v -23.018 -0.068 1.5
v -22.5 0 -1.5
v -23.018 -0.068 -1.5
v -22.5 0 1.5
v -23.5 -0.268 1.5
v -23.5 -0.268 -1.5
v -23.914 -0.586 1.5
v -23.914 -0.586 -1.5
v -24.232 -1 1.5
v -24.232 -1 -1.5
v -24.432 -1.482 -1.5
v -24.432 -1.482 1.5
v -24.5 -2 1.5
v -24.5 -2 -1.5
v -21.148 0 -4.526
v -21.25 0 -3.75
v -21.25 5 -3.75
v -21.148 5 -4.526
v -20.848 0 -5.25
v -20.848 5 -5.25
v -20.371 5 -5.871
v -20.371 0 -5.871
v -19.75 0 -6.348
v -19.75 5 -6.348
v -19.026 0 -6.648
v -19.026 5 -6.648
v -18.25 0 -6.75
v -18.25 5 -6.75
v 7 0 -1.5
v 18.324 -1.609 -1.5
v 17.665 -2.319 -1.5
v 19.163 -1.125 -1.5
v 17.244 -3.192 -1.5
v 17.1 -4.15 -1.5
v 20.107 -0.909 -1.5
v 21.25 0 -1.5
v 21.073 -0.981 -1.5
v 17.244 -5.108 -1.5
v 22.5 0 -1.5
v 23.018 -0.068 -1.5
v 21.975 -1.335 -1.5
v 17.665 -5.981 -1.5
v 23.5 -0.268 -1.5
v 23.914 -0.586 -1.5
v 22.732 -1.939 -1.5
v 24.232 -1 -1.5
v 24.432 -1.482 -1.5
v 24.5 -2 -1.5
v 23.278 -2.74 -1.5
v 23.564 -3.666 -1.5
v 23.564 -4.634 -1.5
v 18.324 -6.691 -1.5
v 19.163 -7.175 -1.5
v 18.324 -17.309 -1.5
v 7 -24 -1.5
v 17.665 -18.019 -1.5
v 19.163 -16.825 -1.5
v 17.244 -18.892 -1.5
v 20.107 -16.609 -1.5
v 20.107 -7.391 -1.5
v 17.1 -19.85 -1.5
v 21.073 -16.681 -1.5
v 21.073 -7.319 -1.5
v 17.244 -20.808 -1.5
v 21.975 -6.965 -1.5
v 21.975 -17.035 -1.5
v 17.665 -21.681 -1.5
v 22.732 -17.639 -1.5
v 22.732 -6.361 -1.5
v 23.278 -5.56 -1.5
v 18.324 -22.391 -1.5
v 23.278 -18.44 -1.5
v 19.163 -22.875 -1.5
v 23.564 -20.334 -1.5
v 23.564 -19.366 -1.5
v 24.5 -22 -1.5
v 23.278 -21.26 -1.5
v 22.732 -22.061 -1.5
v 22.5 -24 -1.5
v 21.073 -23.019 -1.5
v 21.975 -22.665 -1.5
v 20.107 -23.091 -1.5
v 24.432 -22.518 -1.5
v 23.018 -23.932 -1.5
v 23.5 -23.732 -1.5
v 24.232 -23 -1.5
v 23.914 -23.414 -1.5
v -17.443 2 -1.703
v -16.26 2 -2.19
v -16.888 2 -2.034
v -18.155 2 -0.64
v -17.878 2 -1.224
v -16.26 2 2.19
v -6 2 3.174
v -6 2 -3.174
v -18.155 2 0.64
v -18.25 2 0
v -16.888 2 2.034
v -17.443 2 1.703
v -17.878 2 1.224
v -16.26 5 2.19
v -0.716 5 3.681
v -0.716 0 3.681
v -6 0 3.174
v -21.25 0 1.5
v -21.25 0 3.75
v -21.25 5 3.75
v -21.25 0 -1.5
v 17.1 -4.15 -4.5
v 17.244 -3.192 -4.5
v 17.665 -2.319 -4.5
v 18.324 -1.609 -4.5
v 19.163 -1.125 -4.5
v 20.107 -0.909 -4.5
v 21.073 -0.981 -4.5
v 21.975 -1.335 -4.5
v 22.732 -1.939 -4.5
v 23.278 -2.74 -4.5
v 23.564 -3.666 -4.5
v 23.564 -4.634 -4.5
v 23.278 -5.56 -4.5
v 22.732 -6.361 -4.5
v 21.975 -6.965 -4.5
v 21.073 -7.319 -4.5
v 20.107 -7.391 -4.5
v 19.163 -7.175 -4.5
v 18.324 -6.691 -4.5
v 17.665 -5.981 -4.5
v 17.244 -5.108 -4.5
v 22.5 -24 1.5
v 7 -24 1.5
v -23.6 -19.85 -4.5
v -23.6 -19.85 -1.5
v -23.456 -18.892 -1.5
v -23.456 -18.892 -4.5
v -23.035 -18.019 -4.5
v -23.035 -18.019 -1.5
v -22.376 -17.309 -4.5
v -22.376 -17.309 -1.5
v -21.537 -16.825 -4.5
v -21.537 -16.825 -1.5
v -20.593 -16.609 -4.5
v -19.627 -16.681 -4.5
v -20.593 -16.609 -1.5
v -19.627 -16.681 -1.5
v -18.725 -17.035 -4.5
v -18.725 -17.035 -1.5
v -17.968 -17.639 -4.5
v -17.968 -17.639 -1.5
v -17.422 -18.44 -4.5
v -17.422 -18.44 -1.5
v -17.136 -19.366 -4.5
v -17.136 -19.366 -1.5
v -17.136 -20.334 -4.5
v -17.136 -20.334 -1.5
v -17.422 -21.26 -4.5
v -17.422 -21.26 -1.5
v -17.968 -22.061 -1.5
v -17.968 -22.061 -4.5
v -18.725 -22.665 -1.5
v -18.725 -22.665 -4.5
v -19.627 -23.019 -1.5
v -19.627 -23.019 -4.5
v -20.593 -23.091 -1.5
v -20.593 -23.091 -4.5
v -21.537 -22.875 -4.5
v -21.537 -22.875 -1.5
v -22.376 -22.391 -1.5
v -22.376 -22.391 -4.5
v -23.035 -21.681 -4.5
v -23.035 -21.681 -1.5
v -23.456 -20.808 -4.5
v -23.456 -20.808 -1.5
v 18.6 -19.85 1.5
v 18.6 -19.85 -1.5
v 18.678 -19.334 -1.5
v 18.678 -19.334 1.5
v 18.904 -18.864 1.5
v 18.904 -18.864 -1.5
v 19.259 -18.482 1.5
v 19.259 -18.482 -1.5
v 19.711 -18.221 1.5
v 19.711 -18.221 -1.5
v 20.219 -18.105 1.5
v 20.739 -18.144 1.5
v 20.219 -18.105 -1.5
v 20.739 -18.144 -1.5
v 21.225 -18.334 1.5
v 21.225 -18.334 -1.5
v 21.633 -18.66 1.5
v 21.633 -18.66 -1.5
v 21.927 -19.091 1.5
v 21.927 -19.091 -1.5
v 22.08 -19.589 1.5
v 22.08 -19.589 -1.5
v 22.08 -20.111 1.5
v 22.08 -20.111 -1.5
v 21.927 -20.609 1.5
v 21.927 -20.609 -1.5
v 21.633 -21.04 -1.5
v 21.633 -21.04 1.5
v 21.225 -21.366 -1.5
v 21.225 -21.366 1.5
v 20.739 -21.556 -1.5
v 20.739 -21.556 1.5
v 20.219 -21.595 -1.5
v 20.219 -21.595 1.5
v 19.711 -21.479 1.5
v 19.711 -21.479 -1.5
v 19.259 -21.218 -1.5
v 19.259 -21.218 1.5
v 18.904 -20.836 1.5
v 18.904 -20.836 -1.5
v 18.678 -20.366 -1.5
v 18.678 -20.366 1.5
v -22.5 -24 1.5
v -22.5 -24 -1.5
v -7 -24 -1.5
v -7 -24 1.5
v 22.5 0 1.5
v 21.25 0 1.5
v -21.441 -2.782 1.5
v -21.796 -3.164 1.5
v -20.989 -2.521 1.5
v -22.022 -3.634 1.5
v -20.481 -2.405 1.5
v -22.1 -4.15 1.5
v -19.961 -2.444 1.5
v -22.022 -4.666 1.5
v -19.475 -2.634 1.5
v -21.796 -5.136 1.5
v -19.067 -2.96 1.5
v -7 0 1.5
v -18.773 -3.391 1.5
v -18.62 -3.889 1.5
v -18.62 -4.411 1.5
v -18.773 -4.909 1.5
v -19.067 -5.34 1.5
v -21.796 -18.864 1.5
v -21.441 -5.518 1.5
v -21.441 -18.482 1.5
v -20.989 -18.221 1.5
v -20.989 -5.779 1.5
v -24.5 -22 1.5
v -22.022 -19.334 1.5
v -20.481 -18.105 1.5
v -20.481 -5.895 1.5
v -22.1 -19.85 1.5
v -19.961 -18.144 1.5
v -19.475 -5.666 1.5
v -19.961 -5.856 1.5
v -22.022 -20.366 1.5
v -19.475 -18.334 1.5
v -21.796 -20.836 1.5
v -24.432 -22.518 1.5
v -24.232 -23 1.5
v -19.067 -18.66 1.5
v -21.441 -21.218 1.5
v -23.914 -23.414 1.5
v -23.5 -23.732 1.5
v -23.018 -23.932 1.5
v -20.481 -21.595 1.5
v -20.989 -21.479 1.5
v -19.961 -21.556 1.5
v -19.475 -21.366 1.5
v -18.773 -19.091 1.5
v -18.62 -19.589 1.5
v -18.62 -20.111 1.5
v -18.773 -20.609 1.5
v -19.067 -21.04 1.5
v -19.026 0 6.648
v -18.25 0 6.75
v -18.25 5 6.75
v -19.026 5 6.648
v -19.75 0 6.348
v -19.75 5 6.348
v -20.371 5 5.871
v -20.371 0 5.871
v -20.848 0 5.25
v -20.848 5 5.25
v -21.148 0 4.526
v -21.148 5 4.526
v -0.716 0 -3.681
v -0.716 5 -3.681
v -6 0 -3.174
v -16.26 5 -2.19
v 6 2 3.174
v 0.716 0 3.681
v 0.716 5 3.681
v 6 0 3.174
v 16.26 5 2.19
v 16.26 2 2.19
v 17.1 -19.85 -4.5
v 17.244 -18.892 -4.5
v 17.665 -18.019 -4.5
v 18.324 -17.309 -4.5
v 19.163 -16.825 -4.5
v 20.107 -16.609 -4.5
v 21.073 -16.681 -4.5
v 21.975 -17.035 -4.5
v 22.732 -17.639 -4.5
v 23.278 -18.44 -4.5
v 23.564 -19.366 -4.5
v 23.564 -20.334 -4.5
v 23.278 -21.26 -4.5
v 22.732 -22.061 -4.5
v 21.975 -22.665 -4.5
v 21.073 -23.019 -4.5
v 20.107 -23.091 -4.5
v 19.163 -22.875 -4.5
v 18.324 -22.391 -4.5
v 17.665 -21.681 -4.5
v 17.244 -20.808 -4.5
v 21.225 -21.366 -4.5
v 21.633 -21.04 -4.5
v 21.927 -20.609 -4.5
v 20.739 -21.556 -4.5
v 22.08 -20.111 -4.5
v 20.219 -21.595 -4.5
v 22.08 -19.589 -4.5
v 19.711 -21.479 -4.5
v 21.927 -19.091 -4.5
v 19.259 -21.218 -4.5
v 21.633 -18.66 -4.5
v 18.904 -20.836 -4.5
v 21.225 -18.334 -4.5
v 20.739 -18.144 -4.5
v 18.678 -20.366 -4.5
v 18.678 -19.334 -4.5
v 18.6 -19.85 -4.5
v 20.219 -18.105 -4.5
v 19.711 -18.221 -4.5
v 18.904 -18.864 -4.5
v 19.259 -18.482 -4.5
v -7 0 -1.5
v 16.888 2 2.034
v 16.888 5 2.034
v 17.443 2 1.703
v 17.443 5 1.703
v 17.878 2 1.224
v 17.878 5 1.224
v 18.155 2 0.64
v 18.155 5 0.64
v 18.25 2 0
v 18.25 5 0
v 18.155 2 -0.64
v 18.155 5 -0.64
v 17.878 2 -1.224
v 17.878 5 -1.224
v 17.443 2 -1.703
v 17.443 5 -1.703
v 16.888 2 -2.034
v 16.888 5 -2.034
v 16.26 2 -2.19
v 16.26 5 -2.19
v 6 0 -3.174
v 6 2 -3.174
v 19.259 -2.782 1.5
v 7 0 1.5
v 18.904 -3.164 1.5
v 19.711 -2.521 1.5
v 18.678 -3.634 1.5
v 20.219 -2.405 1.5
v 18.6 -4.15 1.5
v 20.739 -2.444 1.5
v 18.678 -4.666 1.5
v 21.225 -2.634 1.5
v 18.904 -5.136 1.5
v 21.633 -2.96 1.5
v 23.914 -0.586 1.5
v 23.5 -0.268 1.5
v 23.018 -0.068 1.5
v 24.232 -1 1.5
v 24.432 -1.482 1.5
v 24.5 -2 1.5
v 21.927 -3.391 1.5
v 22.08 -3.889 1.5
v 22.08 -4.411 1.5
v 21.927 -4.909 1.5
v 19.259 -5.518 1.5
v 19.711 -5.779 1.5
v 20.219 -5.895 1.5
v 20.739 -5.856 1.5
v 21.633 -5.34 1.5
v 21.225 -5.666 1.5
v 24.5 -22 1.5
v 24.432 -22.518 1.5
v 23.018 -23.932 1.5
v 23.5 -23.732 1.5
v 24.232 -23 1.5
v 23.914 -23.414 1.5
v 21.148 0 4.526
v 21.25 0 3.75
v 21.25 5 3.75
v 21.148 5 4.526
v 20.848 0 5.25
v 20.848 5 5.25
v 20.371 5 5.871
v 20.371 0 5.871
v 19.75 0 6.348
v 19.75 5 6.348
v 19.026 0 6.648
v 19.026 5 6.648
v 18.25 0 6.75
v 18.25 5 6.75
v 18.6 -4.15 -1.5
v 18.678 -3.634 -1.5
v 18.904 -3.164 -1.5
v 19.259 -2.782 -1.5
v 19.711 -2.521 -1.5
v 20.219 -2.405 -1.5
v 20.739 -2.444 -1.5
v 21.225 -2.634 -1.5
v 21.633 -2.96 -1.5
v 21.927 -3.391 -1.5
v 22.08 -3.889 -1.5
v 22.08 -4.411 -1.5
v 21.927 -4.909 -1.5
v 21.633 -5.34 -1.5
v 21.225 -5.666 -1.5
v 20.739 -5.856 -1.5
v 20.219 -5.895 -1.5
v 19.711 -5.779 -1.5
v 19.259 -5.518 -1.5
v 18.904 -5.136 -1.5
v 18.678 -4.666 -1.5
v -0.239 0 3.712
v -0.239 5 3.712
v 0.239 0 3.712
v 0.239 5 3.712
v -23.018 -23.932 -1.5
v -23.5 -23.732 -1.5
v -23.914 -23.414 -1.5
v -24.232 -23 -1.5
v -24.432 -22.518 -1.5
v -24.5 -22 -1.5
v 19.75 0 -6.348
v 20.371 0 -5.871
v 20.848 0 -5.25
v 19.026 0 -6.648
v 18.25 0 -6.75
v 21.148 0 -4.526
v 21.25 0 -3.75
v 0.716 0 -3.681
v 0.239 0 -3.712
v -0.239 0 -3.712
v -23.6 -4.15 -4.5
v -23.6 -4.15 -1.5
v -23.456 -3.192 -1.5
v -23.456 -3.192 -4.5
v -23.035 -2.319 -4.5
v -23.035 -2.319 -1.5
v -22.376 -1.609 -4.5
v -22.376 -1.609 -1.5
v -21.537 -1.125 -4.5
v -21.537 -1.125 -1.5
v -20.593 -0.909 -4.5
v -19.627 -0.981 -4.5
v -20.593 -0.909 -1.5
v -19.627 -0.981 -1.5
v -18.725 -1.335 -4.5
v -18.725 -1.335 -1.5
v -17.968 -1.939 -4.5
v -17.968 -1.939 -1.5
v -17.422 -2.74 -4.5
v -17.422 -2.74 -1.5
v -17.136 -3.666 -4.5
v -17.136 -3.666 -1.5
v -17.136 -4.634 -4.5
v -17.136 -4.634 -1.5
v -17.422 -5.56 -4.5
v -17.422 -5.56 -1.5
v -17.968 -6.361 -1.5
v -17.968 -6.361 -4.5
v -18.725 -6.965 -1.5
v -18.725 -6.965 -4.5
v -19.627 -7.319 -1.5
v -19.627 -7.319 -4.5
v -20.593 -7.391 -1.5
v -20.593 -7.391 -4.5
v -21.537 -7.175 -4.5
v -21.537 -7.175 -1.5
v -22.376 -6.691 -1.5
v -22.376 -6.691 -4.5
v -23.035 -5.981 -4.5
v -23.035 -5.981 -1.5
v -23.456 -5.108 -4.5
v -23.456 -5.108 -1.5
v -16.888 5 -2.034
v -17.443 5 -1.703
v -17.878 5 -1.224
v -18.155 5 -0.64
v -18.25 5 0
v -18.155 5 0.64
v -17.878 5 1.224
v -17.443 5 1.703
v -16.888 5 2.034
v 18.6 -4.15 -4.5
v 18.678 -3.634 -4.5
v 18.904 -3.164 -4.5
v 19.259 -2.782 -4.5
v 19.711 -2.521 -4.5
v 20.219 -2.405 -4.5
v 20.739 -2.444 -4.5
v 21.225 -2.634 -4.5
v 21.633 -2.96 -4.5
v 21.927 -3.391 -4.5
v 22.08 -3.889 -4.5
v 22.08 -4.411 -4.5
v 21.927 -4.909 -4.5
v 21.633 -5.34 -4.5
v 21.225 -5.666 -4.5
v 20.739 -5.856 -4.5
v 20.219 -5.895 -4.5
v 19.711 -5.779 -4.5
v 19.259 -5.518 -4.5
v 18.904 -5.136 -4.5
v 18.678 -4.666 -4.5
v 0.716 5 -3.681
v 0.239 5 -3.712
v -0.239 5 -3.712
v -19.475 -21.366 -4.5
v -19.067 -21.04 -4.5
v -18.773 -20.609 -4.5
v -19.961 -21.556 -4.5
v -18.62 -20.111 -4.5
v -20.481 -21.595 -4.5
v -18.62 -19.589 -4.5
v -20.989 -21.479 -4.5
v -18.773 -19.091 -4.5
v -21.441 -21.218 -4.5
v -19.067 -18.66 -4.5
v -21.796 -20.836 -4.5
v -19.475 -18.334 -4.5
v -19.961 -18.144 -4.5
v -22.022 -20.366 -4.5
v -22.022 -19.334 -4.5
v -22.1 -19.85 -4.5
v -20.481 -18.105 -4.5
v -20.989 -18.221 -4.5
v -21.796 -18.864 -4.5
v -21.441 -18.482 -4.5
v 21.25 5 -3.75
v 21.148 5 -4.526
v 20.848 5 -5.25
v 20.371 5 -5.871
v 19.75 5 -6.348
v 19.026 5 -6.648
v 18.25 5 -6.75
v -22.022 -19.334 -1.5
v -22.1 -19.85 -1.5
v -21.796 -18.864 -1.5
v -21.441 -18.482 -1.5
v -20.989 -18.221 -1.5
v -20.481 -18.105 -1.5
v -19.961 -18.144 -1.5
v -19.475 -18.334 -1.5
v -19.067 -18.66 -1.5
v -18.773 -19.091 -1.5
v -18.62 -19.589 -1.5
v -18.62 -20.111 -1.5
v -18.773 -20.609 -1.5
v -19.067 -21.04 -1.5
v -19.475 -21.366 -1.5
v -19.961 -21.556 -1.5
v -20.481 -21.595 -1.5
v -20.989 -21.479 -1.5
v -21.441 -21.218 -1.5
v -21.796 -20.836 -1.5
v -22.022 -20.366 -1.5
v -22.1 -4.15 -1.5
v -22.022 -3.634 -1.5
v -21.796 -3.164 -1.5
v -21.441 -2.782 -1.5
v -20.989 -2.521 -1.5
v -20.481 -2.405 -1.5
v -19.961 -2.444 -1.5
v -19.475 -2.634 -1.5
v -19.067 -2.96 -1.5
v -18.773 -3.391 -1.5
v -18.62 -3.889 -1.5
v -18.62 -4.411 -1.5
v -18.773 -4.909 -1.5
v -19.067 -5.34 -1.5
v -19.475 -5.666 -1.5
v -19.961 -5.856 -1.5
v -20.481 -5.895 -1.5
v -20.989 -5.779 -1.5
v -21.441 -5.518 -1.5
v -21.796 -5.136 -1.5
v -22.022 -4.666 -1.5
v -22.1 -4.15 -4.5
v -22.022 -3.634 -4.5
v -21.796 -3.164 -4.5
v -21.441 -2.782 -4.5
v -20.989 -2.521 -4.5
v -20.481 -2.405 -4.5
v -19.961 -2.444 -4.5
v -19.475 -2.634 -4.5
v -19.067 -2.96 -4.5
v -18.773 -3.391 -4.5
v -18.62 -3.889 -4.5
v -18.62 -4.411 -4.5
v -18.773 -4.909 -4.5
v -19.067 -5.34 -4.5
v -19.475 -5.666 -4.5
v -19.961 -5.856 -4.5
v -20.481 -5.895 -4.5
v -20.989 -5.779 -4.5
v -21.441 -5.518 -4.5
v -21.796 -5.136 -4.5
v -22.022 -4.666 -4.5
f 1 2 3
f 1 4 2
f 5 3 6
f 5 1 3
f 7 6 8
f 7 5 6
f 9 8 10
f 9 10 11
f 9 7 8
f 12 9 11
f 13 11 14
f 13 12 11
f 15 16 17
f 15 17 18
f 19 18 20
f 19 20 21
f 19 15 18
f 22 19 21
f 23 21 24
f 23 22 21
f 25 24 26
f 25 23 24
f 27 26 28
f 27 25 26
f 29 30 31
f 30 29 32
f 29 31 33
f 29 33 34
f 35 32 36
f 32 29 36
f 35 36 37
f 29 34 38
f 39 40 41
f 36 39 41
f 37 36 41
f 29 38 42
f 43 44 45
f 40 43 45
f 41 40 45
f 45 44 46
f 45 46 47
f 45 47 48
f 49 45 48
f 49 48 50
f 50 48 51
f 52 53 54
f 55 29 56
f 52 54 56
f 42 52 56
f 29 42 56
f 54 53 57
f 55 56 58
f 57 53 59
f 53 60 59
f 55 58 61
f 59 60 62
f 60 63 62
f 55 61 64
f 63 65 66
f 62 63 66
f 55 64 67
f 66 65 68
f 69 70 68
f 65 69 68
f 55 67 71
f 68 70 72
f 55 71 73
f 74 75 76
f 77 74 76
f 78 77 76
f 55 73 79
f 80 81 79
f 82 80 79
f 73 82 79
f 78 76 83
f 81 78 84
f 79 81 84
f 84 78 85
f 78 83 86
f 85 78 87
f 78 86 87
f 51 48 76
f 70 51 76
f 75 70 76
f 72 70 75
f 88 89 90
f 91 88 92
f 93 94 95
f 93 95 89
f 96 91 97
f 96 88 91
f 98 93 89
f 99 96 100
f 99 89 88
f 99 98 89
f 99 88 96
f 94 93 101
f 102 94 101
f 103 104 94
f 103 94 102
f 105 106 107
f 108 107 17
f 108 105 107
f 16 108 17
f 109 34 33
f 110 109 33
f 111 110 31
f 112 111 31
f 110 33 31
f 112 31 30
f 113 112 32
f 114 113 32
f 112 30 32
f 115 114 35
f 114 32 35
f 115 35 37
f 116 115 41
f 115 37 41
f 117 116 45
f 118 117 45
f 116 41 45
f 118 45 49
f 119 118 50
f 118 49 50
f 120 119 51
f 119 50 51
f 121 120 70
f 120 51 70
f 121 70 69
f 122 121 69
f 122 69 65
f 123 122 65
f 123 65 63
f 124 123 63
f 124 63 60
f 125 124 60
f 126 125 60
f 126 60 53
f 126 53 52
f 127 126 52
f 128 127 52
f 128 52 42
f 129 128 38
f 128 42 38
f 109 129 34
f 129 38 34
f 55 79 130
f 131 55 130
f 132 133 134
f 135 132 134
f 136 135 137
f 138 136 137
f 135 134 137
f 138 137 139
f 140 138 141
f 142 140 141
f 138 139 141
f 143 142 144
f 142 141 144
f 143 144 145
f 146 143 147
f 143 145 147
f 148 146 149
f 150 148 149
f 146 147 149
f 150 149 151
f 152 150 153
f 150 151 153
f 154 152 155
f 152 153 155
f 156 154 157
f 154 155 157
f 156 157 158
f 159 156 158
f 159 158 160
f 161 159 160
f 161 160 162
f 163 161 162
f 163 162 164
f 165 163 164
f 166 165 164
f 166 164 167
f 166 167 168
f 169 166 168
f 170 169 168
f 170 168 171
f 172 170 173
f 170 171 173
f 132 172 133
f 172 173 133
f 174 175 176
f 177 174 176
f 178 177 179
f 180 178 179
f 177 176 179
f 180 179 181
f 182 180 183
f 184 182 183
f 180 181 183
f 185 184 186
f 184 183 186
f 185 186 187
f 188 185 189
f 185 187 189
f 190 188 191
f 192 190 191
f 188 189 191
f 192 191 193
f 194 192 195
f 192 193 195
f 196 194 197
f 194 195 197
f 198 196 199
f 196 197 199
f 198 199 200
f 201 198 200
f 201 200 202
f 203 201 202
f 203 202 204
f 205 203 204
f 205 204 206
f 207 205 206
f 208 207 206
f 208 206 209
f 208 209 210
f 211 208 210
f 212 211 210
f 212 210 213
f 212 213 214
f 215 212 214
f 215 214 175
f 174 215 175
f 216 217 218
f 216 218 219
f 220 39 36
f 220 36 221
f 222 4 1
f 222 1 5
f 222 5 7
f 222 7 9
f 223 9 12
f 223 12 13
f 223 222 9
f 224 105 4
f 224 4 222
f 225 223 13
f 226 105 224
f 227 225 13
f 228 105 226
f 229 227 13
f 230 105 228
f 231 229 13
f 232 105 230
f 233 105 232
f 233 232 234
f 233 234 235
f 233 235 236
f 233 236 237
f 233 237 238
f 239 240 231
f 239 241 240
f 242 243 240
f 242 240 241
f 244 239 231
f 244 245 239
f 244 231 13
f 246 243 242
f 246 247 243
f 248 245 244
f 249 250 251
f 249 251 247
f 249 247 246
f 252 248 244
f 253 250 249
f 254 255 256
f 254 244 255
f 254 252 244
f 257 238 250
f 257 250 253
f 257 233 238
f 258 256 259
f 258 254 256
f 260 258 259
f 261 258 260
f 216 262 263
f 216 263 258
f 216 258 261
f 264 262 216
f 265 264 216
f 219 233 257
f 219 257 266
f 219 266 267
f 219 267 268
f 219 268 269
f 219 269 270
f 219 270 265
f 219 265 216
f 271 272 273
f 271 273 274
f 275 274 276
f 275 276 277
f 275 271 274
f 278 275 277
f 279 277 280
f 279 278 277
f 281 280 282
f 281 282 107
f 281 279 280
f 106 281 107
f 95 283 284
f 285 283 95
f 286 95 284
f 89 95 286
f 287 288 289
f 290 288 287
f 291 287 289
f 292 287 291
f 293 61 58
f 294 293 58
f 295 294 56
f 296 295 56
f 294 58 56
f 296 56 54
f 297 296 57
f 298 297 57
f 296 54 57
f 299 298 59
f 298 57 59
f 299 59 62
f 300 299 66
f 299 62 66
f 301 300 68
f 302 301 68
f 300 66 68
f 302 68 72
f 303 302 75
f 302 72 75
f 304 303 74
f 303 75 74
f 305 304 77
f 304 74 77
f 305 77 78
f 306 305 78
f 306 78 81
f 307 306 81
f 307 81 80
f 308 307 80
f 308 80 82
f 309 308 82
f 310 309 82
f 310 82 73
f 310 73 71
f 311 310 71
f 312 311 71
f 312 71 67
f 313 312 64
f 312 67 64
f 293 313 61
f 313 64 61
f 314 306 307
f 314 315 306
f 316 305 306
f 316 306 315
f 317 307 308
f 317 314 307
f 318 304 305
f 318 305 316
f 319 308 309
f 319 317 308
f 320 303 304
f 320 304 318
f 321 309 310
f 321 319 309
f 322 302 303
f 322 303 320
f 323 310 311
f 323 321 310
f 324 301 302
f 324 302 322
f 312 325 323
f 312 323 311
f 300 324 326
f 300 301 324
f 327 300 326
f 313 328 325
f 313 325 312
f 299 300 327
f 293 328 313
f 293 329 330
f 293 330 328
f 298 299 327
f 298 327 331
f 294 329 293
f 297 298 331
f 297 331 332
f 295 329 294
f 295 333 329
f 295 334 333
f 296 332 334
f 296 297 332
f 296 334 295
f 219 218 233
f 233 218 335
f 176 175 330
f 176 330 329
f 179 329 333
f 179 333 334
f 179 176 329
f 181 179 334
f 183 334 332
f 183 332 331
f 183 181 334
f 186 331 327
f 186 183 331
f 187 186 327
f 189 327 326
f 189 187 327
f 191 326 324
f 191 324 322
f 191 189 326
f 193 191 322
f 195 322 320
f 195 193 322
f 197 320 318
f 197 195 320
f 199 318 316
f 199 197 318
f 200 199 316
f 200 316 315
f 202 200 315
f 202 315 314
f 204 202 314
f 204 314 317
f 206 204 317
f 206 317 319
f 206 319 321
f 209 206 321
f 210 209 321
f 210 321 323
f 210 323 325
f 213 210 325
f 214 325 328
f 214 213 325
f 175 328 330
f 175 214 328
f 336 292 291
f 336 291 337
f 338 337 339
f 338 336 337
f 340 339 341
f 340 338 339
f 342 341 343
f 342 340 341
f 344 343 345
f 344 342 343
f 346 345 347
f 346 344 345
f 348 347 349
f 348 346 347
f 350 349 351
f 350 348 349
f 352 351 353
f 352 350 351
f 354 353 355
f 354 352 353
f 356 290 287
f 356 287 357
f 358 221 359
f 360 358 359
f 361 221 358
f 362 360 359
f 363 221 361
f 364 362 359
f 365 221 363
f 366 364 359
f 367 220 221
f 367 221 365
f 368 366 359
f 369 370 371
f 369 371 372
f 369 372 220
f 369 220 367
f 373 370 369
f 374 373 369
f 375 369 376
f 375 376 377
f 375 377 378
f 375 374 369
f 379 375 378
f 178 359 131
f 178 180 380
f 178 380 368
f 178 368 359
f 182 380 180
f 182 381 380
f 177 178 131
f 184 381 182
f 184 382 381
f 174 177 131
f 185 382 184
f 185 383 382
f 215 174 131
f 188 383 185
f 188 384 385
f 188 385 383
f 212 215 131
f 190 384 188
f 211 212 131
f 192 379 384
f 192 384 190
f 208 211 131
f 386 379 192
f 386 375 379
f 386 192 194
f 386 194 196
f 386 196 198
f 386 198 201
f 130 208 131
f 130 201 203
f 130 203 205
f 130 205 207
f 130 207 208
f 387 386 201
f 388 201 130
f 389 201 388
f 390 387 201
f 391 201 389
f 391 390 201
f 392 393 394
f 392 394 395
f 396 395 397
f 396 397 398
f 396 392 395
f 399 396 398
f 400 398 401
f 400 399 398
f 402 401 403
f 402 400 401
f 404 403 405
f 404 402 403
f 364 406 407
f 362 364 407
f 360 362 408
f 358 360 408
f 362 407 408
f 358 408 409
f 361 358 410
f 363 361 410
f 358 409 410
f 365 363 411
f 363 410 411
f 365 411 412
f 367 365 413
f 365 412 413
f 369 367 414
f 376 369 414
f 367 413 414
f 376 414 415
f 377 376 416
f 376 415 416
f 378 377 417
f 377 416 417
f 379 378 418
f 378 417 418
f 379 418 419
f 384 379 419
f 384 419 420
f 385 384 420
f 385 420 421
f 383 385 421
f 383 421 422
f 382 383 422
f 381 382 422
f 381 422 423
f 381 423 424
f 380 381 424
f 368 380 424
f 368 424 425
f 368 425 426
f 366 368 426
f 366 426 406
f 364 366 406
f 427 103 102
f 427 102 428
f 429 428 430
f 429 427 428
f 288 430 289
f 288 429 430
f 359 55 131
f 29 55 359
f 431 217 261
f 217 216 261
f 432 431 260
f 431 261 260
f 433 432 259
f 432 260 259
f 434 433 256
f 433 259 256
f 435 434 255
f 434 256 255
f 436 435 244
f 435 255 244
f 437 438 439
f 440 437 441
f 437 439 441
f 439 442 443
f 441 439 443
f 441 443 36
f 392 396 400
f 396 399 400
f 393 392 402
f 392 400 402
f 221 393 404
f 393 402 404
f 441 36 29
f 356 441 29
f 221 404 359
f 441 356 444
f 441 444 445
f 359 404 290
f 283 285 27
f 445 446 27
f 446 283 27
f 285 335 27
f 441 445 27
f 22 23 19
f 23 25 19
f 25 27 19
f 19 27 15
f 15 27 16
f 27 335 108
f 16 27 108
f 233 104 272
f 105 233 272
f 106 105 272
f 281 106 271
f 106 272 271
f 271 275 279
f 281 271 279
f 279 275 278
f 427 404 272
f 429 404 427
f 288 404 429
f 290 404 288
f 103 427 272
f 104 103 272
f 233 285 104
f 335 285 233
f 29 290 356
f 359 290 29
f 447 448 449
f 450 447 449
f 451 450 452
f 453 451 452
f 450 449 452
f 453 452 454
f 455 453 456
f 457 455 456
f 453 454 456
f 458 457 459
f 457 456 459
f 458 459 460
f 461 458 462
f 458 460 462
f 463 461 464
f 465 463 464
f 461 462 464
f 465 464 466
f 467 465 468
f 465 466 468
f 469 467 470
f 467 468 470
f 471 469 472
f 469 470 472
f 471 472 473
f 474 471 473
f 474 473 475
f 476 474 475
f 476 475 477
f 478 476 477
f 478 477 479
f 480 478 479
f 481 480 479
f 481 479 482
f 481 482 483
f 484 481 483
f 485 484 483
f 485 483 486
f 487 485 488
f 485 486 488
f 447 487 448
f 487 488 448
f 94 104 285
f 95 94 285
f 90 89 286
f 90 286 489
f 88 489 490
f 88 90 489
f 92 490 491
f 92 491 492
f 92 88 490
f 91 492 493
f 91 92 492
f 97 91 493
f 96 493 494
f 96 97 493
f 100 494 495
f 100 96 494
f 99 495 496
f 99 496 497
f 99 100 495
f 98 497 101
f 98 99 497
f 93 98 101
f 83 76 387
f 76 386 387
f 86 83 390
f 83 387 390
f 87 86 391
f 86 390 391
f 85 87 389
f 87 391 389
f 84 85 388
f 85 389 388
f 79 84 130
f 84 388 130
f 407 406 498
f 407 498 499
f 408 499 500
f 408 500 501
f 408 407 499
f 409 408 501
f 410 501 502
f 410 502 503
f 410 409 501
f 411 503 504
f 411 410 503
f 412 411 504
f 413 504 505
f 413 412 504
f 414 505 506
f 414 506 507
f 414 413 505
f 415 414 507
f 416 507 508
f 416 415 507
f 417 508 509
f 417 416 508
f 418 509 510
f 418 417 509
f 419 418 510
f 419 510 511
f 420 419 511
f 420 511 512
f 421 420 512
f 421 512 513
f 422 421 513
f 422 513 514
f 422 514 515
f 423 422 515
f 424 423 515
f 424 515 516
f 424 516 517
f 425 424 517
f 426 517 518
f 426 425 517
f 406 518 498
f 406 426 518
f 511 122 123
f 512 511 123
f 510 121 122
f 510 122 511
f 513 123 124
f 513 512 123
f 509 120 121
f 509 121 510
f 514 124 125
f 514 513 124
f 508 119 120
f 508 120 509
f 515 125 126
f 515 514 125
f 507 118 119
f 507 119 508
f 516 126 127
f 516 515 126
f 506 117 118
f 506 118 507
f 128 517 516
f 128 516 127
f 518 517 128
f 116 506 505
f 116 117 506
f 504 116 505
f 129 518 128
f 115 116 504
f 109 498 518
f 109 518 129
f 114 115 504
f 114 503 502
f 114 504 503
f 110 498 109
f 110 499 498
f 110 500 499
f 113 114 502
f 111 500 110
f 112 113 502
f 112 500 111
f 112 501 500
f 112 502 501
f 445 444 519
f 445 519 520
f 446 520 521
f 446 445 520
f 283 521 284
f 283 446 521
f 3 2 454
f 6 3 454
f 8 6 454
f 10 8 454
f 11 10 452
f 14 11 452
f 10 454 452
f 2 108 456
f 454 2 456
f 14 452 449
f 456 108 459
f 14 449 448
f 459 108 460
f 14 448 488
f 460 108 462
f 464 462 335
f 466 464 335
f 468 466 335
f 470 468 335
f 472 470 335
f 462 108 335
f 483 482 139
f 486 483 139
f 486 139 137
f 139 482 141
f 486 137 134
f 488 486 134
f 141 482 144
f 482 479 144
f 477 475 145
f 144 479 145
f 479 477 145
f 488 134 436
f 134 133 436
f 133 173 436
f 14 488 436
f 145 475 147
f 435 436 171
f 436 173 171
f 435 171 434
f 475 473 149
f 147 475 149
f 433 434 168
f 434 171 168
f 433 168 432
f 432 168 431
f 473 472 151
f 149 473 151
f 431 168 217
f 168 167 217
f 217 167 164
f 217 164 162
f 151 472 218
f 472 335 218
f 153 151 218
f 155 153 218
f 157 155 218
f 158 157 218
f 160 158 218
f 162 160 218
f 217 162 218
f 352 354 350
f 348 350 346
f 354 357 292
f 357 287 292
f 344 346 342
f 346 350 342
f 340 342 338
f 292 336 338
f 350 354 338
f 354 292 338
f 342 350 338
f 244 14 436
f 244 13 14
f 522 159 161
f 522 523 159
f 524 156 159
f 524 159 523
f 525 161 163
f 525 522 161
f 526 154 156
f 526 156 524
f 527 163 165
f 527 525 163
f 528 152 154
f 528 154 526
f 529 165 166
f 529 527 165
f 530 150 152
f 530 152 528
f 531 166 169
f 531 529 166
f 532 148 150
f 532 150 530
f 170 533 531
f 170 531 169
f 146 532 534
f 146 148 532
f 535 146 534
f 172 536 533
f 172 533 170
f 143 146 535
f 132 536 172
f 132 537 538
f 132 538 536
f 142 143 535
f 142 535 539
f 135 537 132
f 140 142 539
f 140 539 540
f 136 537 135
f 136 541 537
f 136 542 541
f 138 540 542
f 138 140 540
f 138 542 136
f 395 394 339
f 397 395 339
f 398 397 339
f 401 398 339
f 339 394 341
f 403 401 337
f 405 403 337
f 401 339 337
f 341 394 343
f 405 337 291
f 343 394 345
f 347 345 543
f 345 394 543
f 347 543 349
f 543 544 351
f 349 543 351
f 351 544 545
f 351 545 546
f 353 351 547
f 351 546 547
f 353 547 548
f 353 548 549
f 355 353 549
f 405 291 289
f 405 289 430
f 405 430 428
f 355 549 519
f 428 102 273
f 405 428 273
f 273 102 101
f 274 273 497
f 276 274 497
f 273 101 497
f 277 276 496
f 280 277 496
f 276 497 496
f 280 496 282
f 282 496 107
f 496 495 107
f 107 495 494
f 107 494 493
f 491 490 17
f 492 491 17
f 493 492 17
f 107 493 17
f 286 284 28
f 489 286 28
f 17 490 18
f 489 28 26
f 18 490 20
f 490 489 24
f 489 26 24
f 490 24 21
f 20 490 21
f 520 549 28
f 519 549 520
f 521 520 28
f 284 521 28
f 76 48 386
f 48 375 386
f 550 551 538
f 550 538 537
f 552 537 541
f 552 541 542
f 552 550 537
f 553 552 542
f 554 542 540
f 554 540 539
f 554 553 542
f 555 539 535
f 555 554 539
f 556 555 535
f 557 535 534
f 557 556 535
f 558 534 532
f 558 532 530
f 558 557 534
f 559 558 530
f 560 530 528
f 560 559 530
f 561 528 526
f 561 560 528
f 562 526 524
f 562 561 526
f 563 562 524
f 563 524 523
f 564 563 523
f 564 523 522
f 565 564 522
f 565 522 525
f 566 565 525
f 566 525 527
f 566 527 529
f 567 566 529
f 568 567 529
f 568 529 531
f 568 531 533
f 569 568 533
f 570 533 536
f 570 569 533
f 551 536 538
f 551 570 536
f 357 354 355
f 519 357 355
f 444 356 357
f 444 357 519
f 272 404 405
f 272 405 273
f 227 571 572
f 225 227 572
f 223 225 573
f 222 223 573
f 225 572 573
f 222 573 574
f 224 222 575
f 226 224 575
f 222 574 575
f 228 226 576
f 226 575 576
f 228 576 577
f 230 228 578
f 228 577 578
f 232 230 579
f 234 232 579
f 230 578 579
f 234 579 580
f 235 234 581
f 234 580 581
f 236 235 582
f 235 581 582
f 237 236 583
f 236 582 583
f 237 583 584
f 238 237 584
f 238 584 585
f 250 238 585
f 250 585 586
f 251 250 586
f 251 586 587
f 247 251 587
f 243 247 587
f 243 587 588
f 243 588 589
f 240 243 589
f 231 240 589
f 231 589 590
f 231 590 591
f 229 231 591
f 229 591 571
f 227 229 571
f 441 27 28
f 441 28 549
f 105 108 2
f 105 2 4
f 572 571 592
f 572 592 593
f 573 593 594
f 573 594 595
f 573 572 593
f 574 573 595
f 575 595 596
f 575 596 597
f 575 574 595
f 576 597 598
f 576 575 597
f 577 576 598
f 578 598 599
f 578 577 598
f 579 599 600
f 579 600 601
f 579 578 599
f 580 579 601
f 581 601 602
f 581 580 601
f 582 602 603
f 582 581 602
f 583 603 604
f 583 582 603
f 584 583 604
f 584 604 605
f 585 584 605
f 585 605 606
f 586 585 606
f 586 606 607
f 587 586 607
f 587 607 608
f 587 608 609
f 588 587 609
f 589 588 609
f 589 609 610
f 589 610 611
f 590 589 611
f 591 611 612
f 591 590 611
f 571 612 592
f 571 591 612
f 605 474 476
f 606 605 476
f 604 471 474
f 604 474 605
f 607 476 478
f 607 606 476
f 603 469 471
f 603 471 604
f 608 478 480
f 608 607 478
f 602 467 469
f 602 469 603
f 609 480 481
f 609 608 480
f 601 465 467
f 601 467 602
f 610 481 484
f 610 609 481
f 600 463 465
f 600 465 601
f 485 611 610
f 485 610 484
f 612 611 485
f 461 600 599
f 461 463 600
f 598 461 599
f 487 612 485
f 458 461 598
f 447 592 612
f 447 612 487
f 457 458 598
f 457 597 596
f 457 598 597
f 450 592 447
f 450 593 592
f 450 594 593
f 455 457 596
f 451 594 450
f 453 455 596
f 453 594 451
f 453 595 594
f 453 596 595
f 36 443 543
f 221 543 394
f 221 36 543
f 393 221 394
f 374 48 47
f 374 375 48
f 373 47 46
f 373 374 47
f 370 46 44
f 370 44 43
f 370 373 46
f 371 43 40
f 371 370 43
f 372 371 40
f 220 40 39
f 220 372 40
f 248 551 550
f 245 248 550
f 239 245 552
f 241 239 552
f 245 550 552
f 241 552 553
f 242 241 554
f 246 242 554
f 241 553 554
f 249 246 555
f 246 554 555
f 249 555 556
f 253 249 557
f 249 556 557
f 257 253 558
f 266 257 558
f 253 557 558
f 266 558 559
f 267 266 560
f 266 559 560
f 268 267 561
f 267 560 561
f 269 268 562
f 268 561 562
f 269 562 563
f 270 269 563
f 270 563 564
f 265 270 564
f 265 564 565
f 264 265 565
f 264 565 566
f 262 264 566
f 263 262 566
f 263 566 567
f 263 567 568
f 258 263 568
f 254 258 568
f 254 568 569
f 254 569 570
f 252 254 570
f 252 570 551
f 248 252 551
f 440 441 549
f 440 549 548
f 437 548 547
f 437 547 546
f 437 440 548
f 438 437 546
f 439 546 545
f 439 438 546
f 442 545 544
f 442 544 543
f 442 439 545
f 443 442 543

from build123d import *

# Parameters (mm, degrees)
BOSS_EXTRUDE1_DEPTH = 5
BOSS_EXTRUDE2_DEPTH = 2
SKETCH4_W           = 24
SKETCH4_H           = 3
BOSS_EXTRUDE3_DEPTH = 49
CUT_EXTRUDE1_REACH  = 10.25
SKETCH5_R           = 1.75
SKETCH5_W           = 14
SKETCH5_H           = 24
SKETCH6_R           = 3.25
SKETCH6_R_2         = 1.75
BOSS_EXTRUDE4_DEPTH = 3
FILLET1_R           = 2


with BuildPart() as part:
    # Sketch1 → Boss-Extrude1 (new body)
    with BuildSketch(Plane(origin=(0, 0, 0), x_dir=(1, 0, 0), z_dir=(0, 1, 0))):
        with BuildLine():
            Line((-18.25, 6.75), (18.25, 6.75))
            ThreePointArc((18.25, 6.75), (20.371320344, 5.871320344), (21.25, 3.75))
            Line((21.25, 3.75), (21.25, -3.75))
            ThreePointArc((21.25, -3.75), (20.371320344, -5.871320344), (18.25, -6.75))
            Line((18.25, -6.75), (-18.25, -6.75))
            ThreePointArc((-18.25, -6.75), (-20.371320344, -5.871320344), (-21.25, -3.75))
            Line((-21.25, -3.75), (-21.25, 3.75))
            ThreePointArc((-21.25, 3.75), (-20.371320344, 5.871320344), (-18.25, 6.75))
        make_face()
        with BuildLine():
            Line((16.260111444, 2.189943648), (0.716289014, 3.681276533))
            ThreePointArc((0.716289014, 3.681276533), (0, 3.715559552), (-0.716289014, 3.681276533))
            Line((-0.716289014, 3.681276533), (-16.260111444, 2.189943648))
            ThreePointArc((-16.260111444, 2.189943648), (-18.25, 0), (-16.260111444, -2.189943648))
            Line((-16.260111444, -2.189943648), (-0.716289014, -3.681276533))
            ThreePointArc((-0.716289014, -3.681276533), (0, -3.715559552), (0.716289014, -3.681276533))
            Line((0.716289014, -3.681276533), (16.260111444, -2.189943648))
            ThreePointArc((16.260111444, -2.189943648), (18.25, 0), (16.260111444, 2.189943648))
        make_face(mode=Mode.SUBTRACT)
    extrude(amount=BOSS_EXTRUDE1_DEPTH)

    # Sketch2 → Boss-Extrude2 (add)
    with BuildSketch(Plane.XZ):
        with BuildLine():
            Line((-16.260111444, 2.189943648), (-6, 3.174337395))
            Line((-6, 3.174337395), (-6, -3.174337395))
            Line((-6, -3.174337395), (-16.260111444, -2.189943648))
            ThreePointArc((-16.260111444, -2.189943648), (-18.25, 0), (-16.260111444, 2.189943648))
        make_face()
        with BuildLine():
            Line((6, -3.174337395), (16.260111444, -2.189943648))
            ThreePointArc((16.260111444, -2.189943648), (18.25, 0), (16.260111444, 2.189943648))
            Line((16.260111444, 2.189943648), (6, 3.174337395))
            Line((6, 3.174337395), (6, -3.174337395))
        make_face()
    extrude(amount=-BOSS_EXTRUDE2_DEPTH)

    # Sketch4 → Boss-Extrude3 (add)
    with BuildSketch(Plane(origin=(24.5, 24.5, 0), x_dir=(0, -1, 0), z_dir=(-1, 0, 0))):
        with Locations((36.5, 0)):
            Rectangle(SKETCH4_W, SKETCH4_H)
    extrude(amount=BOSS_EXTRUDE3_DEPTH)

    # Sketch5 → Cut-Extrude1 (cut, up to next)
    with BuildSketch(Plane(origin=(0, 0, -1.5), x_dir=(-1, 0, 0), z_dir=(0, 0, -1)), mode=Mode.PRIVATE) as cut_extrude1_sk1:
        with Locations((20.35, -19.85)):
            Circle(SKETCH5_R)
    cut_extrude1_tool1 = extrude(cut_extrude1_sk1.sketch, amount=-CUT_EXTRUDE1_REACH, mode=Mode.PRIVATE) & part.part
    add(cut_extrude1_tool1.solids().sort_by_distance((-20.35, -19.85, -1.5))[0], mode=Mode.SUBTRACT)
    # Sketch5 → Cut-Extrude1 (cut, up to next)
    with BuildSketch(Plane(origin=(0, 0, -1.5), x_dir=(-1, 0, 0), z_dir=(0, 0, -1)), mode=Mode.PRIVATE) as cut_extrude1_sk2:
        with Locations((-20.35, -19.85)):
            Circle(SKETCH5_R)
    cut_extrude1_tool2 = extrude(cut_extrude1_sk2.sketch, amount=-CUT_EXTRUDE1_REACH, mode=Mode.PRIVATE) & part.part
    add(cut_extrude1_tool2.solids().sort_by_distance((20.35, -19.85, -1.5))[0], mode=Mode.SUBTRACT)
    # Sketch5 → Cut-Extrude1 (cut, up to next)
    with BuildSketch(Plane(origin=(0, 0, -1.5), x_dir=(-1, 0, 0), z_dir=(0, 0, -1)), mode=Mode.PRIVATE) as cut_extrude1_sk3:
        with Locations((-20.35, -4.15)):
            Circle(SKETCH5_R)
    cut_extrude1_tool3 = extrude(cut_extrude1_sk3.sketch, amount=-CUT_EXTRUDE1_REACH, mode=Mode.PRIVATE) & part.part
    add(cut_extrude1_tool3.solids().sort_by_distance((20.35, -4.15, -1.5))[0], mode=Mode.SUBTRACT)
    # Sketch5 → Cut-Extrude1 (cut, up to next)
    with BuildSketch(Plane(origin=(0, 0, -1.5), x_dir=(-1, 0, 0), z_dir=(0, 0, -1)), mode=Mode.PRIVATE) as cut_extrude1_sk4:
        with Locations((20.35, -4.15)):
            Circle(SKETCH5_R)
    cut_extrude1_tool4 = extrude(cut_extrude1_sk4.sketch, amount=-CUT_EXTRUDE1_REACH, mode=Mode.PRIVATE) & part.part
    add(cut_extrude1_tool4.solids().sort_by_distance((-20.35, -4.15, -1.5))[0], mode=Mode.SUBTRACT)
    # Sketch5 → Cut-Extrude1 (cut, up to next)
    with BuildSketch(Plane(origin=(0, 0, -1.5), x_dir=(-1, 0, 0), z_dir=(0, 0, -1)), mode=Mode.PRIVATE) as cut_extrude1_sk5:
        with Locations((0, -12)):
            Rectangle(SKETCH5_W, SKETCH5_H)
    cut_extrude1_tool5 = extrude(cut_extrude1_sk5.sketch, amount=-CUT_EXTRUDE1_REACH, mode=Mode.PRIVATE) & part.part
    add(cut_extrude1_tool5.solids().sort_by_distance((0, -12, -1.5))[0], mode=Mode.SUBTRACT)

    # Sketch6 → Boss-Extrude4 (add)
    with BuildSketch(Plane(origin=(0, 0, -1.5), x_dir=(-1, 0, 0), z_dir=(0, 0, -1))):
        with Locations((-20.35, -4.15)):
            Circle(SKETCH6_R)
        with Locations((-20.35, -4.15)):
            Circle(SKETCH6_R_2, mode=Mode.SUBTRACT)
        with Locations((20.35, -4.15)):
            Circle(SKETCH6_R)
        with Locations((20.35, -4.15)):
            Circle(SKETCH6_R_2, mode=Mode.SUBTRACT)
        with Locations((20.35, -19.85)):
            Circle(SKETCH6_R)
        with Locations((20.35, -19.85)):
            Circle(SKETCH6_R_2, mode=Mode.SUBTRACT)
        with Locations((-20.35, -19.85)):
            Circle(SKETCH6_R)
        with Locations((-20.35, -19.85)):
            Circle(SKETCH6_R_2, mode=Mode.SUBTRACT)
    extrude(amount=BOSS_EXTRUDE4_DEPTH)

    # Fillet1
    fillet1_edges = [part.edges().sort_by_distance(p)[0] for p in [
        (24.5, 0, 0),
        (24.5, -24, 0),
        (-24.5, 0, 0),
        (-24.5, -24, 0),
    ]]
    fillet(fillet1_edges, radius=FILLET1_R)


solid = part.part
